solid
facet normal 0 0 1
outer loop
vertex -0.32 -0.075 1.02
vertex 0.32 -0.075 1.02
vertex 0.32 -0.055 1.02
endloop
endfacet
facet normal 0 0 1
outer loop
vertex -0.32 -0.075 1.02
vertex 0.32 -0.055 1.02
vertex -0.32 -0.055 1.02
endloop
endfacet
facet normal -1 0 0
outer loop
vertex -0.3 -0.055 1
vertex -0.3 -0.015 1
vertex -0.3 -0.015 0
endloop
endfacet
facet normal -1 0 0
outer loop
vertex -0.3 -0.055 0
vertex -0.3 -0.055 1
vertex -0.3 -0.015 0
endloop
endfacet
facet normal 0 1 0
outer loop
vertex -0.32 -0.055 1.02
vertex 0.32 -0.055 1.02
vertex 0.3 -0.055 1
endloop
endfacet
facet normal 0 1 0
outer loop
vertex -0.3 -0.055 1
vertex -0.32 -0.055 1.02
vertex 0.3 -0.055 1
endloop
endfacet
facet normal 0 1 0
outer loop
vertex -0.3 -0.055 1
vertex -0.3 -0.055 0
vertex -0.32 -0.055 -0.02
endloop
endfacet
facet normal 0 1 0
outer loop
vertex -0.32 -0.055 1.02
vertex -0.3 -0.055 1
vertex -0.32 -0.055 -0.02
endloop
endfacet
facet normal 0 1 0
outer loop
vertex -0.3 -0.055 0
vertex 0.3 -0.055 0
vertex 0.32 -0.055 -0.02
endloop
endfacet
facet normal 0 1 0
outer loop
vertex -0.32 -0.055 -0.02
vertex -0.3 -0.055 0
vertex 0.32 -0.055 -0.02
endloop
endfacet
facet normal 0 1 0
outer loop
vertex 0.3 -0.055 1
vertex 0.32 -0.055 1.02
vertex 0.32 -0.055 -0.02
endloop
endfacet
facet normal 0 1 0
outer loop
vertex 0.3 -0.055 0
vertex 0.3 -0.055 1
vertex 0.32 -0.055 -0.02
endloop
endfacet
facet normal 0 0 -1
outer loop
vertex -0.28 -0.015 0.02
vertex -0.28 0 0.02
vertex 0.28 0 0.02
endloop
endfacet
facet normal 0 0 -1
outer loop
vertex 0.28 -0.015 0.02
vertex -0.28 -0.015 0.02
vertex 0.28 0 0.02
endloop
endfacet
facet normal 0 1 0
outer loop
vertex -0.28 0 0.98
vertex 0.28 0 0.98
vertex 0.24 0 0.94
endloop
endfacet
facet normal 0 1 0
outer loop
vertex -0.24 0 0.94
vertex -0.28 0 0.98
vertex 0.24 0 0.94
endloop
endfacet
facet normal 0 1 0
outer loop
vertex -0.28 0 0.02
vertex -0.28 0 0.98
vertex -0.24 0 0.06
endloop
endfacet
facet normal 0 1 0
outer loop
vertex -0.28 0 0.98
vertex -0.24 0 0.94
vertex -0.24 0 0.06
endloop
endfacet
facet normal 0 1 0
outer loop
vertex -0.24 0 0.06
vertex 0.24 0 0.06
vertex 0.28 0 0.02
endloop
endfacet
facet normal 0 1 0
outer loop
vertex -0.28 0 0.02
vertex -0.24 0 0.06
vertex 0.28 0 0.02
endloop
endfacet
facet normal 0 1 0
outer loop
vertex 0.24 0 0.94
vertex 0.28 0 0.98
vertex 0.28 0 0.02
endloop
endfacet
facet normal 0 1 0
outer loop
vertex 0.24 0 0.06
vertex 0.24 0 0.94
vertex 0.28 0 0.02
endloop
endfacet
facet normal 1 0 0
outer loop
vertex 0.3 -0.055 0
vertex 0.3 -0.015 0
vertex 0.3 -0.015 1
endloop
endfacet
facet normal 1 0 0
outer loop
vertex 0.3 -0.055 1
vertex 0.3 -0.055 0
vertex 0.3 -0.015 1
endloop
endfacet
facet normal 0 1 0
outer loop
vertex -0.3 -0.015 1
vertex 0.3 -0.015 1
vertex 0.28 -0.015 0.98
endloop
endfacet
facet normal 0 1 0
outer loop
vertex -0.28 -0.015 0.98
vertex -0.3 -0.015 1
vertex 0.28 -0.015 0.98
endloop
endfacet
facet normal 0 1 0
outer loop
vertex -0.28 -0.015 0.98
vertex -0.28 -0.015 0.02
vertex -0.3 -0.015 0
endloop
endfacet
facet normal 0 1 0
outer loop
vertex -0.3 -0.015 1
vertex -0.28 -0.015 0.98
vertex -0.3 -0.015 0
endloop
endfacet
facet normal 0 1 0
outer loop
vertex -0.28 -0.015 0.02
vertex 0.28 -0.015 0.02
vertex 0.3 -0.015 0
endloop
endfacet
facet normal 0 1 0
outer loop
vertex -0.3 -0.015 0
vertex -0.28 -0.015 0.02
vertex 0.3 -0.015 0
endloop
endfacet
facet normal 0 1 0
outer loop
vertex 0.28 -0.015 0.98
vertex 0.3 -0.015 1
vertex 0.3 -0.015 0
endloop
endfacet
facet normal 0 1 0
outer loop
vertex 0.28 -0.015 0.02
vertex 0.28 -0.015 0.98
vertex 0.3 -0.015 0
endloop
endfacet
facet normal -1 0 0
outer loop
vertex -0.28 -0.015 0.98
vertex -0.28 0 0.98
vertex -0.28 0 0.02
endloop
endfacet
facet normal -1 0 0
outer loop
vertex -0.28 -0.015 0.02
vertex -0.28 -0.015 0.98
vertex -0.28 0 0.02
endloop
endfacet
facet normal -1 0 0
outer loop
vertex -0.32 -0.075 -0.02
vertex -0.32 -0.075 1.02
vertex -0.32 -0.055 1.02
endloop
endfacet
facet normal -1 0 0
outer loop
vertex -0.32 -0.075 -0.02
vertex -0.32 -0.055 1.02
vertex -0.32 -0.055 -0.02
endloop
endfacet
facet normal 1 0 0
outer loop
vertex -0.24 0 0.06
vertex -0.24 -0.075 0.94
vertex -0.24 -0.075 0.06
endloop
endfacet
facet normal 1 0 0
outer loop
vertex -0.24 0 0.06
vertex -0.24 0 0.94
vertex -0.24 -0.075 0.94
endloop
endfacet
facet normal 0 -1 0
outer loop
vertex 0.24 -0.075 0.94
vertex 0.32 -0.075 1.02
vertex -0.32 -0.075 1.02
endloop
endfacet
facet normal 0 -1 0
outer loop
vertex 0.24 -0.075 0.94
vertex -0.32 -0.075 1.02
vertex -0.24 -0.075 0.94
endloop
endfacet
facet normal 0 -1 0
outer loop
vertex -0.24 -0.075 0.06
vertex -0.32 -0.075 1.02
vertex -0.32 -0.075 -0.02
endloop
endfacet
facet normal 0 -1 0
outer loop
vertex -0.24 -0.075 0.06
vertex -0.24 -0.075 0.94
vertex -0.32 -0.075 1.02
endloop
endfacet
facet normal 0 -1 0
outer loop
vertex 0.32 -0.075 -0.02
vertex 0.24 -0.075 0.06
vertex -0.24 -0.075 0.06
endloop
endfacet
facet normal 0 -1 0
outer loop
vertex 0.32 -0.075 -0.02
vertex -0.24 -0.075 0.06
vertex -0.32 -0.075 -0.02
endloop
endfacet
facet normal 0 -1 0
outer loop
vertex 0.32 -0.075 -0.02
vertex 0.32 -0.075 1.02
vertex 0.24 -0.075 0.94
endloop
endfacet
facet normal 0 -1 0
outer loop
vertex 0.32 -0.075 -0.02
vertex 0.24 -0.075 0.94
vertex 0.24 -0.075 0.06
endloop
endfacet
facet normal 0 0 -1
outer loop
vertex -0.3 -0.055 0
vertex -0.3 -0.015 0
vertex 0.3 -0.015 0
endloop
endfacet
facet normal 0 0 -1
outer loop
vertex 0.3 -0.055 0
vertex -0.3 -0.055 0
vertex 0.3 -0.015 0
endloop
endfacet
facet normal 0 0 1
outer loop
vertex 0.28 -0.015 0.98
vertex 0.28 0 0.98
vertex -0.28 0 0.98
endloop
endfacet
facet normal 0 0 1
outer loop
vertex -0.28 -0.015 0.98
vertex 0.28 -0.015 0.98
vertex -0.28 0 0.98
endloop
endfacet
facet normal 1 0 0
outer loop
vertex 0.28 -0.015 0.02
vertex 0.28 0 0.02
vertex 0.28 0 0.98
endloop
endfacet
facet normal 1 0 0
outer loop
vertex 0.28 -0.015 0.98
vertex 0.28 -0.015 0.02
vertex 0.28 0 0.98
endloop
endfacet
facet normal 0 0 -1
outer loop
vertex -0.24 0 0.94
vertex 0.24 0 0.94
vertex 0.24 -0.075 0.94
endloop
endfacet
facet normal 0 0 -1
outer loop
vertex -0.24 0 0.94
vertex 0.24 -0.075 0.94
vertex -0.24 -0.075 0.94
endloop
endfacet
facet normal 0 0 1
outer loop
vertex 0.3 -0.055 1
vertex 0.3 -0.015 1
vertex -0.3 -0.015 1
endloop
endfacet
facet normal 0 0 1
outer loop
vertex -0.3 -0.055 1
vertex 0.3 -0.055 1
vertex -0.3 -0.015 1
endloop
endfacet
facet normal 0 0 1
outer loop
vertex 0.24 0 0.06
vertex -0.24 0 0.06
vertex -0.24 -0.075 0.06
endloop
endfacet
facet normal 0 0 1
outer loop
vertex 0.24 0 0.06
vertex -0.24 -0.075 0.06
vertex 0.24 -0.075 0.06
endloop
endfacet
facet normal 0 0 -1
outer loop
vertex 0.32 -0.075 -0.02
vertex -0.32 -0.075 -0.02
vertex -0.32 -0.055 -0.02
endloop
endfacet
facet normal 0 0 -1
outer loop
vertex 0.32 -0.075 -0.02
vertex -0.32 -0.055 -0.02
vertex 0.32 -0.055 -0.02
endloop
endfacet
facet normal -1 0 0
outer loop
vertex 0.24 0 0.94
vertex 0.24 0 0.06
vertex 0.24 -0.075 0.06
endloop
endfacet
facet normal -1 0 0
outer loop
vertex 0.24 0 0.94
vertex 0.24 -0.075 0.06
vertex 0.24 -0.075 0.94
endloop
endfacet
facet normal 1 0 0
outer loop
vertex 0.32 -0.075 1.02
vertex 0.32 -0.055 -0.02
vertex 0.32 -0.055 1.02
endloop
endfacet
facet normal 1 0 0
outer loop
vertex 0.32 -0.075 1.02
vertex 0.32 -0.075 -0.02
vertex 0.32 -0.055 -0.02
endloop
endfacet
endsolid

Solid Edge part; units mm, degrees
sketch "Sketch1" plane through (0, 0, 0) normal (0, -1, 0) x (1, 0, 0)
  line L0 (-0.3, 0) -> (0.3, 0)
  line L1 (0.3, 0) -> (0.3, 1)
  line L2 (0.3, 1) -> (-0.3, 1)
  line L3 (-0.3, 1) -> (-0.3, 0)
  dimension "D1" = 1
  dimension "D2" = 0.6
extrude "Protrusion1" add sketch "Sketch1" along normal blind 0.075
sketch "Sketch2" plane through (0, 0, 0.69) normal (0, 1, 0) x (-1, 0, 0)
  line L0 (-0.24, 0.25) -> (0.24, 0.25)
  line L1 (0.24, 0.25) -> (0.24, -0.63)
  line L2 (0.24, -0.63) -> (-0.24, -0.63)
  line L3 (-0.24, -0.63) -> (-0.24, 0.25)
extrude "Cutout1" cut sketch "Sketch2" against normal up to next
sketch "Sketch3" plane through (0, 0, 0.69) normal (0, 1, 0) x (-1, 0, 0)
  line L0 (-0.28, -0.67) -> (-0.28, 0.29)
  line L1 (-0.28, 0.29) -> (0.28, 0.29)
  line L2 (0.28, 0.29) -> (0.28, -0.67)
  line L3 (0.28, -0.67) -> (-0.28, -0.67)
  line L4 (-0.3, -0.69) -> (-0.3, 0.31)
  line L5 (-0.3, 0.31) -> (0.3, 0.31)
  line L6 (0.3, 0.31) -> (0.3, -0.69)
  line L7 (0.3, -0.69) -> (-0.3, -0.69)
extrude "Ausschnitt_1" cut sketch "Sketch3" against normal blind 0.015
sketch "Sketch4" plane through (0, -0.075, 0.69) normal (0, -1, 0) x (1, 0, 0)
  line L0 (-0.32, 0.33) -> (-0.32, -0.71)
  line L1 (-0.32, -0.71) -> (0.32, -0.71)
  line L2 (0.32, -0.71) -> (0.32, 0.33)
  line L3 (0.32, 0.33) -> (-0.32, 0.33)
  line L4 (0.3, 0.31) -> (-0.3, 0.31)
  line L5 (-0.3, 0.31) -> (-0.3, -0.69)
  line L6 (-0.3, -0.69) -> (0.3, -0.69)
  line L7 (0.3, -0.69) -> (0.3, 0.31)
extrude "Ausprägung_2" add sketch "Sketch4" against normal blind 0.02
